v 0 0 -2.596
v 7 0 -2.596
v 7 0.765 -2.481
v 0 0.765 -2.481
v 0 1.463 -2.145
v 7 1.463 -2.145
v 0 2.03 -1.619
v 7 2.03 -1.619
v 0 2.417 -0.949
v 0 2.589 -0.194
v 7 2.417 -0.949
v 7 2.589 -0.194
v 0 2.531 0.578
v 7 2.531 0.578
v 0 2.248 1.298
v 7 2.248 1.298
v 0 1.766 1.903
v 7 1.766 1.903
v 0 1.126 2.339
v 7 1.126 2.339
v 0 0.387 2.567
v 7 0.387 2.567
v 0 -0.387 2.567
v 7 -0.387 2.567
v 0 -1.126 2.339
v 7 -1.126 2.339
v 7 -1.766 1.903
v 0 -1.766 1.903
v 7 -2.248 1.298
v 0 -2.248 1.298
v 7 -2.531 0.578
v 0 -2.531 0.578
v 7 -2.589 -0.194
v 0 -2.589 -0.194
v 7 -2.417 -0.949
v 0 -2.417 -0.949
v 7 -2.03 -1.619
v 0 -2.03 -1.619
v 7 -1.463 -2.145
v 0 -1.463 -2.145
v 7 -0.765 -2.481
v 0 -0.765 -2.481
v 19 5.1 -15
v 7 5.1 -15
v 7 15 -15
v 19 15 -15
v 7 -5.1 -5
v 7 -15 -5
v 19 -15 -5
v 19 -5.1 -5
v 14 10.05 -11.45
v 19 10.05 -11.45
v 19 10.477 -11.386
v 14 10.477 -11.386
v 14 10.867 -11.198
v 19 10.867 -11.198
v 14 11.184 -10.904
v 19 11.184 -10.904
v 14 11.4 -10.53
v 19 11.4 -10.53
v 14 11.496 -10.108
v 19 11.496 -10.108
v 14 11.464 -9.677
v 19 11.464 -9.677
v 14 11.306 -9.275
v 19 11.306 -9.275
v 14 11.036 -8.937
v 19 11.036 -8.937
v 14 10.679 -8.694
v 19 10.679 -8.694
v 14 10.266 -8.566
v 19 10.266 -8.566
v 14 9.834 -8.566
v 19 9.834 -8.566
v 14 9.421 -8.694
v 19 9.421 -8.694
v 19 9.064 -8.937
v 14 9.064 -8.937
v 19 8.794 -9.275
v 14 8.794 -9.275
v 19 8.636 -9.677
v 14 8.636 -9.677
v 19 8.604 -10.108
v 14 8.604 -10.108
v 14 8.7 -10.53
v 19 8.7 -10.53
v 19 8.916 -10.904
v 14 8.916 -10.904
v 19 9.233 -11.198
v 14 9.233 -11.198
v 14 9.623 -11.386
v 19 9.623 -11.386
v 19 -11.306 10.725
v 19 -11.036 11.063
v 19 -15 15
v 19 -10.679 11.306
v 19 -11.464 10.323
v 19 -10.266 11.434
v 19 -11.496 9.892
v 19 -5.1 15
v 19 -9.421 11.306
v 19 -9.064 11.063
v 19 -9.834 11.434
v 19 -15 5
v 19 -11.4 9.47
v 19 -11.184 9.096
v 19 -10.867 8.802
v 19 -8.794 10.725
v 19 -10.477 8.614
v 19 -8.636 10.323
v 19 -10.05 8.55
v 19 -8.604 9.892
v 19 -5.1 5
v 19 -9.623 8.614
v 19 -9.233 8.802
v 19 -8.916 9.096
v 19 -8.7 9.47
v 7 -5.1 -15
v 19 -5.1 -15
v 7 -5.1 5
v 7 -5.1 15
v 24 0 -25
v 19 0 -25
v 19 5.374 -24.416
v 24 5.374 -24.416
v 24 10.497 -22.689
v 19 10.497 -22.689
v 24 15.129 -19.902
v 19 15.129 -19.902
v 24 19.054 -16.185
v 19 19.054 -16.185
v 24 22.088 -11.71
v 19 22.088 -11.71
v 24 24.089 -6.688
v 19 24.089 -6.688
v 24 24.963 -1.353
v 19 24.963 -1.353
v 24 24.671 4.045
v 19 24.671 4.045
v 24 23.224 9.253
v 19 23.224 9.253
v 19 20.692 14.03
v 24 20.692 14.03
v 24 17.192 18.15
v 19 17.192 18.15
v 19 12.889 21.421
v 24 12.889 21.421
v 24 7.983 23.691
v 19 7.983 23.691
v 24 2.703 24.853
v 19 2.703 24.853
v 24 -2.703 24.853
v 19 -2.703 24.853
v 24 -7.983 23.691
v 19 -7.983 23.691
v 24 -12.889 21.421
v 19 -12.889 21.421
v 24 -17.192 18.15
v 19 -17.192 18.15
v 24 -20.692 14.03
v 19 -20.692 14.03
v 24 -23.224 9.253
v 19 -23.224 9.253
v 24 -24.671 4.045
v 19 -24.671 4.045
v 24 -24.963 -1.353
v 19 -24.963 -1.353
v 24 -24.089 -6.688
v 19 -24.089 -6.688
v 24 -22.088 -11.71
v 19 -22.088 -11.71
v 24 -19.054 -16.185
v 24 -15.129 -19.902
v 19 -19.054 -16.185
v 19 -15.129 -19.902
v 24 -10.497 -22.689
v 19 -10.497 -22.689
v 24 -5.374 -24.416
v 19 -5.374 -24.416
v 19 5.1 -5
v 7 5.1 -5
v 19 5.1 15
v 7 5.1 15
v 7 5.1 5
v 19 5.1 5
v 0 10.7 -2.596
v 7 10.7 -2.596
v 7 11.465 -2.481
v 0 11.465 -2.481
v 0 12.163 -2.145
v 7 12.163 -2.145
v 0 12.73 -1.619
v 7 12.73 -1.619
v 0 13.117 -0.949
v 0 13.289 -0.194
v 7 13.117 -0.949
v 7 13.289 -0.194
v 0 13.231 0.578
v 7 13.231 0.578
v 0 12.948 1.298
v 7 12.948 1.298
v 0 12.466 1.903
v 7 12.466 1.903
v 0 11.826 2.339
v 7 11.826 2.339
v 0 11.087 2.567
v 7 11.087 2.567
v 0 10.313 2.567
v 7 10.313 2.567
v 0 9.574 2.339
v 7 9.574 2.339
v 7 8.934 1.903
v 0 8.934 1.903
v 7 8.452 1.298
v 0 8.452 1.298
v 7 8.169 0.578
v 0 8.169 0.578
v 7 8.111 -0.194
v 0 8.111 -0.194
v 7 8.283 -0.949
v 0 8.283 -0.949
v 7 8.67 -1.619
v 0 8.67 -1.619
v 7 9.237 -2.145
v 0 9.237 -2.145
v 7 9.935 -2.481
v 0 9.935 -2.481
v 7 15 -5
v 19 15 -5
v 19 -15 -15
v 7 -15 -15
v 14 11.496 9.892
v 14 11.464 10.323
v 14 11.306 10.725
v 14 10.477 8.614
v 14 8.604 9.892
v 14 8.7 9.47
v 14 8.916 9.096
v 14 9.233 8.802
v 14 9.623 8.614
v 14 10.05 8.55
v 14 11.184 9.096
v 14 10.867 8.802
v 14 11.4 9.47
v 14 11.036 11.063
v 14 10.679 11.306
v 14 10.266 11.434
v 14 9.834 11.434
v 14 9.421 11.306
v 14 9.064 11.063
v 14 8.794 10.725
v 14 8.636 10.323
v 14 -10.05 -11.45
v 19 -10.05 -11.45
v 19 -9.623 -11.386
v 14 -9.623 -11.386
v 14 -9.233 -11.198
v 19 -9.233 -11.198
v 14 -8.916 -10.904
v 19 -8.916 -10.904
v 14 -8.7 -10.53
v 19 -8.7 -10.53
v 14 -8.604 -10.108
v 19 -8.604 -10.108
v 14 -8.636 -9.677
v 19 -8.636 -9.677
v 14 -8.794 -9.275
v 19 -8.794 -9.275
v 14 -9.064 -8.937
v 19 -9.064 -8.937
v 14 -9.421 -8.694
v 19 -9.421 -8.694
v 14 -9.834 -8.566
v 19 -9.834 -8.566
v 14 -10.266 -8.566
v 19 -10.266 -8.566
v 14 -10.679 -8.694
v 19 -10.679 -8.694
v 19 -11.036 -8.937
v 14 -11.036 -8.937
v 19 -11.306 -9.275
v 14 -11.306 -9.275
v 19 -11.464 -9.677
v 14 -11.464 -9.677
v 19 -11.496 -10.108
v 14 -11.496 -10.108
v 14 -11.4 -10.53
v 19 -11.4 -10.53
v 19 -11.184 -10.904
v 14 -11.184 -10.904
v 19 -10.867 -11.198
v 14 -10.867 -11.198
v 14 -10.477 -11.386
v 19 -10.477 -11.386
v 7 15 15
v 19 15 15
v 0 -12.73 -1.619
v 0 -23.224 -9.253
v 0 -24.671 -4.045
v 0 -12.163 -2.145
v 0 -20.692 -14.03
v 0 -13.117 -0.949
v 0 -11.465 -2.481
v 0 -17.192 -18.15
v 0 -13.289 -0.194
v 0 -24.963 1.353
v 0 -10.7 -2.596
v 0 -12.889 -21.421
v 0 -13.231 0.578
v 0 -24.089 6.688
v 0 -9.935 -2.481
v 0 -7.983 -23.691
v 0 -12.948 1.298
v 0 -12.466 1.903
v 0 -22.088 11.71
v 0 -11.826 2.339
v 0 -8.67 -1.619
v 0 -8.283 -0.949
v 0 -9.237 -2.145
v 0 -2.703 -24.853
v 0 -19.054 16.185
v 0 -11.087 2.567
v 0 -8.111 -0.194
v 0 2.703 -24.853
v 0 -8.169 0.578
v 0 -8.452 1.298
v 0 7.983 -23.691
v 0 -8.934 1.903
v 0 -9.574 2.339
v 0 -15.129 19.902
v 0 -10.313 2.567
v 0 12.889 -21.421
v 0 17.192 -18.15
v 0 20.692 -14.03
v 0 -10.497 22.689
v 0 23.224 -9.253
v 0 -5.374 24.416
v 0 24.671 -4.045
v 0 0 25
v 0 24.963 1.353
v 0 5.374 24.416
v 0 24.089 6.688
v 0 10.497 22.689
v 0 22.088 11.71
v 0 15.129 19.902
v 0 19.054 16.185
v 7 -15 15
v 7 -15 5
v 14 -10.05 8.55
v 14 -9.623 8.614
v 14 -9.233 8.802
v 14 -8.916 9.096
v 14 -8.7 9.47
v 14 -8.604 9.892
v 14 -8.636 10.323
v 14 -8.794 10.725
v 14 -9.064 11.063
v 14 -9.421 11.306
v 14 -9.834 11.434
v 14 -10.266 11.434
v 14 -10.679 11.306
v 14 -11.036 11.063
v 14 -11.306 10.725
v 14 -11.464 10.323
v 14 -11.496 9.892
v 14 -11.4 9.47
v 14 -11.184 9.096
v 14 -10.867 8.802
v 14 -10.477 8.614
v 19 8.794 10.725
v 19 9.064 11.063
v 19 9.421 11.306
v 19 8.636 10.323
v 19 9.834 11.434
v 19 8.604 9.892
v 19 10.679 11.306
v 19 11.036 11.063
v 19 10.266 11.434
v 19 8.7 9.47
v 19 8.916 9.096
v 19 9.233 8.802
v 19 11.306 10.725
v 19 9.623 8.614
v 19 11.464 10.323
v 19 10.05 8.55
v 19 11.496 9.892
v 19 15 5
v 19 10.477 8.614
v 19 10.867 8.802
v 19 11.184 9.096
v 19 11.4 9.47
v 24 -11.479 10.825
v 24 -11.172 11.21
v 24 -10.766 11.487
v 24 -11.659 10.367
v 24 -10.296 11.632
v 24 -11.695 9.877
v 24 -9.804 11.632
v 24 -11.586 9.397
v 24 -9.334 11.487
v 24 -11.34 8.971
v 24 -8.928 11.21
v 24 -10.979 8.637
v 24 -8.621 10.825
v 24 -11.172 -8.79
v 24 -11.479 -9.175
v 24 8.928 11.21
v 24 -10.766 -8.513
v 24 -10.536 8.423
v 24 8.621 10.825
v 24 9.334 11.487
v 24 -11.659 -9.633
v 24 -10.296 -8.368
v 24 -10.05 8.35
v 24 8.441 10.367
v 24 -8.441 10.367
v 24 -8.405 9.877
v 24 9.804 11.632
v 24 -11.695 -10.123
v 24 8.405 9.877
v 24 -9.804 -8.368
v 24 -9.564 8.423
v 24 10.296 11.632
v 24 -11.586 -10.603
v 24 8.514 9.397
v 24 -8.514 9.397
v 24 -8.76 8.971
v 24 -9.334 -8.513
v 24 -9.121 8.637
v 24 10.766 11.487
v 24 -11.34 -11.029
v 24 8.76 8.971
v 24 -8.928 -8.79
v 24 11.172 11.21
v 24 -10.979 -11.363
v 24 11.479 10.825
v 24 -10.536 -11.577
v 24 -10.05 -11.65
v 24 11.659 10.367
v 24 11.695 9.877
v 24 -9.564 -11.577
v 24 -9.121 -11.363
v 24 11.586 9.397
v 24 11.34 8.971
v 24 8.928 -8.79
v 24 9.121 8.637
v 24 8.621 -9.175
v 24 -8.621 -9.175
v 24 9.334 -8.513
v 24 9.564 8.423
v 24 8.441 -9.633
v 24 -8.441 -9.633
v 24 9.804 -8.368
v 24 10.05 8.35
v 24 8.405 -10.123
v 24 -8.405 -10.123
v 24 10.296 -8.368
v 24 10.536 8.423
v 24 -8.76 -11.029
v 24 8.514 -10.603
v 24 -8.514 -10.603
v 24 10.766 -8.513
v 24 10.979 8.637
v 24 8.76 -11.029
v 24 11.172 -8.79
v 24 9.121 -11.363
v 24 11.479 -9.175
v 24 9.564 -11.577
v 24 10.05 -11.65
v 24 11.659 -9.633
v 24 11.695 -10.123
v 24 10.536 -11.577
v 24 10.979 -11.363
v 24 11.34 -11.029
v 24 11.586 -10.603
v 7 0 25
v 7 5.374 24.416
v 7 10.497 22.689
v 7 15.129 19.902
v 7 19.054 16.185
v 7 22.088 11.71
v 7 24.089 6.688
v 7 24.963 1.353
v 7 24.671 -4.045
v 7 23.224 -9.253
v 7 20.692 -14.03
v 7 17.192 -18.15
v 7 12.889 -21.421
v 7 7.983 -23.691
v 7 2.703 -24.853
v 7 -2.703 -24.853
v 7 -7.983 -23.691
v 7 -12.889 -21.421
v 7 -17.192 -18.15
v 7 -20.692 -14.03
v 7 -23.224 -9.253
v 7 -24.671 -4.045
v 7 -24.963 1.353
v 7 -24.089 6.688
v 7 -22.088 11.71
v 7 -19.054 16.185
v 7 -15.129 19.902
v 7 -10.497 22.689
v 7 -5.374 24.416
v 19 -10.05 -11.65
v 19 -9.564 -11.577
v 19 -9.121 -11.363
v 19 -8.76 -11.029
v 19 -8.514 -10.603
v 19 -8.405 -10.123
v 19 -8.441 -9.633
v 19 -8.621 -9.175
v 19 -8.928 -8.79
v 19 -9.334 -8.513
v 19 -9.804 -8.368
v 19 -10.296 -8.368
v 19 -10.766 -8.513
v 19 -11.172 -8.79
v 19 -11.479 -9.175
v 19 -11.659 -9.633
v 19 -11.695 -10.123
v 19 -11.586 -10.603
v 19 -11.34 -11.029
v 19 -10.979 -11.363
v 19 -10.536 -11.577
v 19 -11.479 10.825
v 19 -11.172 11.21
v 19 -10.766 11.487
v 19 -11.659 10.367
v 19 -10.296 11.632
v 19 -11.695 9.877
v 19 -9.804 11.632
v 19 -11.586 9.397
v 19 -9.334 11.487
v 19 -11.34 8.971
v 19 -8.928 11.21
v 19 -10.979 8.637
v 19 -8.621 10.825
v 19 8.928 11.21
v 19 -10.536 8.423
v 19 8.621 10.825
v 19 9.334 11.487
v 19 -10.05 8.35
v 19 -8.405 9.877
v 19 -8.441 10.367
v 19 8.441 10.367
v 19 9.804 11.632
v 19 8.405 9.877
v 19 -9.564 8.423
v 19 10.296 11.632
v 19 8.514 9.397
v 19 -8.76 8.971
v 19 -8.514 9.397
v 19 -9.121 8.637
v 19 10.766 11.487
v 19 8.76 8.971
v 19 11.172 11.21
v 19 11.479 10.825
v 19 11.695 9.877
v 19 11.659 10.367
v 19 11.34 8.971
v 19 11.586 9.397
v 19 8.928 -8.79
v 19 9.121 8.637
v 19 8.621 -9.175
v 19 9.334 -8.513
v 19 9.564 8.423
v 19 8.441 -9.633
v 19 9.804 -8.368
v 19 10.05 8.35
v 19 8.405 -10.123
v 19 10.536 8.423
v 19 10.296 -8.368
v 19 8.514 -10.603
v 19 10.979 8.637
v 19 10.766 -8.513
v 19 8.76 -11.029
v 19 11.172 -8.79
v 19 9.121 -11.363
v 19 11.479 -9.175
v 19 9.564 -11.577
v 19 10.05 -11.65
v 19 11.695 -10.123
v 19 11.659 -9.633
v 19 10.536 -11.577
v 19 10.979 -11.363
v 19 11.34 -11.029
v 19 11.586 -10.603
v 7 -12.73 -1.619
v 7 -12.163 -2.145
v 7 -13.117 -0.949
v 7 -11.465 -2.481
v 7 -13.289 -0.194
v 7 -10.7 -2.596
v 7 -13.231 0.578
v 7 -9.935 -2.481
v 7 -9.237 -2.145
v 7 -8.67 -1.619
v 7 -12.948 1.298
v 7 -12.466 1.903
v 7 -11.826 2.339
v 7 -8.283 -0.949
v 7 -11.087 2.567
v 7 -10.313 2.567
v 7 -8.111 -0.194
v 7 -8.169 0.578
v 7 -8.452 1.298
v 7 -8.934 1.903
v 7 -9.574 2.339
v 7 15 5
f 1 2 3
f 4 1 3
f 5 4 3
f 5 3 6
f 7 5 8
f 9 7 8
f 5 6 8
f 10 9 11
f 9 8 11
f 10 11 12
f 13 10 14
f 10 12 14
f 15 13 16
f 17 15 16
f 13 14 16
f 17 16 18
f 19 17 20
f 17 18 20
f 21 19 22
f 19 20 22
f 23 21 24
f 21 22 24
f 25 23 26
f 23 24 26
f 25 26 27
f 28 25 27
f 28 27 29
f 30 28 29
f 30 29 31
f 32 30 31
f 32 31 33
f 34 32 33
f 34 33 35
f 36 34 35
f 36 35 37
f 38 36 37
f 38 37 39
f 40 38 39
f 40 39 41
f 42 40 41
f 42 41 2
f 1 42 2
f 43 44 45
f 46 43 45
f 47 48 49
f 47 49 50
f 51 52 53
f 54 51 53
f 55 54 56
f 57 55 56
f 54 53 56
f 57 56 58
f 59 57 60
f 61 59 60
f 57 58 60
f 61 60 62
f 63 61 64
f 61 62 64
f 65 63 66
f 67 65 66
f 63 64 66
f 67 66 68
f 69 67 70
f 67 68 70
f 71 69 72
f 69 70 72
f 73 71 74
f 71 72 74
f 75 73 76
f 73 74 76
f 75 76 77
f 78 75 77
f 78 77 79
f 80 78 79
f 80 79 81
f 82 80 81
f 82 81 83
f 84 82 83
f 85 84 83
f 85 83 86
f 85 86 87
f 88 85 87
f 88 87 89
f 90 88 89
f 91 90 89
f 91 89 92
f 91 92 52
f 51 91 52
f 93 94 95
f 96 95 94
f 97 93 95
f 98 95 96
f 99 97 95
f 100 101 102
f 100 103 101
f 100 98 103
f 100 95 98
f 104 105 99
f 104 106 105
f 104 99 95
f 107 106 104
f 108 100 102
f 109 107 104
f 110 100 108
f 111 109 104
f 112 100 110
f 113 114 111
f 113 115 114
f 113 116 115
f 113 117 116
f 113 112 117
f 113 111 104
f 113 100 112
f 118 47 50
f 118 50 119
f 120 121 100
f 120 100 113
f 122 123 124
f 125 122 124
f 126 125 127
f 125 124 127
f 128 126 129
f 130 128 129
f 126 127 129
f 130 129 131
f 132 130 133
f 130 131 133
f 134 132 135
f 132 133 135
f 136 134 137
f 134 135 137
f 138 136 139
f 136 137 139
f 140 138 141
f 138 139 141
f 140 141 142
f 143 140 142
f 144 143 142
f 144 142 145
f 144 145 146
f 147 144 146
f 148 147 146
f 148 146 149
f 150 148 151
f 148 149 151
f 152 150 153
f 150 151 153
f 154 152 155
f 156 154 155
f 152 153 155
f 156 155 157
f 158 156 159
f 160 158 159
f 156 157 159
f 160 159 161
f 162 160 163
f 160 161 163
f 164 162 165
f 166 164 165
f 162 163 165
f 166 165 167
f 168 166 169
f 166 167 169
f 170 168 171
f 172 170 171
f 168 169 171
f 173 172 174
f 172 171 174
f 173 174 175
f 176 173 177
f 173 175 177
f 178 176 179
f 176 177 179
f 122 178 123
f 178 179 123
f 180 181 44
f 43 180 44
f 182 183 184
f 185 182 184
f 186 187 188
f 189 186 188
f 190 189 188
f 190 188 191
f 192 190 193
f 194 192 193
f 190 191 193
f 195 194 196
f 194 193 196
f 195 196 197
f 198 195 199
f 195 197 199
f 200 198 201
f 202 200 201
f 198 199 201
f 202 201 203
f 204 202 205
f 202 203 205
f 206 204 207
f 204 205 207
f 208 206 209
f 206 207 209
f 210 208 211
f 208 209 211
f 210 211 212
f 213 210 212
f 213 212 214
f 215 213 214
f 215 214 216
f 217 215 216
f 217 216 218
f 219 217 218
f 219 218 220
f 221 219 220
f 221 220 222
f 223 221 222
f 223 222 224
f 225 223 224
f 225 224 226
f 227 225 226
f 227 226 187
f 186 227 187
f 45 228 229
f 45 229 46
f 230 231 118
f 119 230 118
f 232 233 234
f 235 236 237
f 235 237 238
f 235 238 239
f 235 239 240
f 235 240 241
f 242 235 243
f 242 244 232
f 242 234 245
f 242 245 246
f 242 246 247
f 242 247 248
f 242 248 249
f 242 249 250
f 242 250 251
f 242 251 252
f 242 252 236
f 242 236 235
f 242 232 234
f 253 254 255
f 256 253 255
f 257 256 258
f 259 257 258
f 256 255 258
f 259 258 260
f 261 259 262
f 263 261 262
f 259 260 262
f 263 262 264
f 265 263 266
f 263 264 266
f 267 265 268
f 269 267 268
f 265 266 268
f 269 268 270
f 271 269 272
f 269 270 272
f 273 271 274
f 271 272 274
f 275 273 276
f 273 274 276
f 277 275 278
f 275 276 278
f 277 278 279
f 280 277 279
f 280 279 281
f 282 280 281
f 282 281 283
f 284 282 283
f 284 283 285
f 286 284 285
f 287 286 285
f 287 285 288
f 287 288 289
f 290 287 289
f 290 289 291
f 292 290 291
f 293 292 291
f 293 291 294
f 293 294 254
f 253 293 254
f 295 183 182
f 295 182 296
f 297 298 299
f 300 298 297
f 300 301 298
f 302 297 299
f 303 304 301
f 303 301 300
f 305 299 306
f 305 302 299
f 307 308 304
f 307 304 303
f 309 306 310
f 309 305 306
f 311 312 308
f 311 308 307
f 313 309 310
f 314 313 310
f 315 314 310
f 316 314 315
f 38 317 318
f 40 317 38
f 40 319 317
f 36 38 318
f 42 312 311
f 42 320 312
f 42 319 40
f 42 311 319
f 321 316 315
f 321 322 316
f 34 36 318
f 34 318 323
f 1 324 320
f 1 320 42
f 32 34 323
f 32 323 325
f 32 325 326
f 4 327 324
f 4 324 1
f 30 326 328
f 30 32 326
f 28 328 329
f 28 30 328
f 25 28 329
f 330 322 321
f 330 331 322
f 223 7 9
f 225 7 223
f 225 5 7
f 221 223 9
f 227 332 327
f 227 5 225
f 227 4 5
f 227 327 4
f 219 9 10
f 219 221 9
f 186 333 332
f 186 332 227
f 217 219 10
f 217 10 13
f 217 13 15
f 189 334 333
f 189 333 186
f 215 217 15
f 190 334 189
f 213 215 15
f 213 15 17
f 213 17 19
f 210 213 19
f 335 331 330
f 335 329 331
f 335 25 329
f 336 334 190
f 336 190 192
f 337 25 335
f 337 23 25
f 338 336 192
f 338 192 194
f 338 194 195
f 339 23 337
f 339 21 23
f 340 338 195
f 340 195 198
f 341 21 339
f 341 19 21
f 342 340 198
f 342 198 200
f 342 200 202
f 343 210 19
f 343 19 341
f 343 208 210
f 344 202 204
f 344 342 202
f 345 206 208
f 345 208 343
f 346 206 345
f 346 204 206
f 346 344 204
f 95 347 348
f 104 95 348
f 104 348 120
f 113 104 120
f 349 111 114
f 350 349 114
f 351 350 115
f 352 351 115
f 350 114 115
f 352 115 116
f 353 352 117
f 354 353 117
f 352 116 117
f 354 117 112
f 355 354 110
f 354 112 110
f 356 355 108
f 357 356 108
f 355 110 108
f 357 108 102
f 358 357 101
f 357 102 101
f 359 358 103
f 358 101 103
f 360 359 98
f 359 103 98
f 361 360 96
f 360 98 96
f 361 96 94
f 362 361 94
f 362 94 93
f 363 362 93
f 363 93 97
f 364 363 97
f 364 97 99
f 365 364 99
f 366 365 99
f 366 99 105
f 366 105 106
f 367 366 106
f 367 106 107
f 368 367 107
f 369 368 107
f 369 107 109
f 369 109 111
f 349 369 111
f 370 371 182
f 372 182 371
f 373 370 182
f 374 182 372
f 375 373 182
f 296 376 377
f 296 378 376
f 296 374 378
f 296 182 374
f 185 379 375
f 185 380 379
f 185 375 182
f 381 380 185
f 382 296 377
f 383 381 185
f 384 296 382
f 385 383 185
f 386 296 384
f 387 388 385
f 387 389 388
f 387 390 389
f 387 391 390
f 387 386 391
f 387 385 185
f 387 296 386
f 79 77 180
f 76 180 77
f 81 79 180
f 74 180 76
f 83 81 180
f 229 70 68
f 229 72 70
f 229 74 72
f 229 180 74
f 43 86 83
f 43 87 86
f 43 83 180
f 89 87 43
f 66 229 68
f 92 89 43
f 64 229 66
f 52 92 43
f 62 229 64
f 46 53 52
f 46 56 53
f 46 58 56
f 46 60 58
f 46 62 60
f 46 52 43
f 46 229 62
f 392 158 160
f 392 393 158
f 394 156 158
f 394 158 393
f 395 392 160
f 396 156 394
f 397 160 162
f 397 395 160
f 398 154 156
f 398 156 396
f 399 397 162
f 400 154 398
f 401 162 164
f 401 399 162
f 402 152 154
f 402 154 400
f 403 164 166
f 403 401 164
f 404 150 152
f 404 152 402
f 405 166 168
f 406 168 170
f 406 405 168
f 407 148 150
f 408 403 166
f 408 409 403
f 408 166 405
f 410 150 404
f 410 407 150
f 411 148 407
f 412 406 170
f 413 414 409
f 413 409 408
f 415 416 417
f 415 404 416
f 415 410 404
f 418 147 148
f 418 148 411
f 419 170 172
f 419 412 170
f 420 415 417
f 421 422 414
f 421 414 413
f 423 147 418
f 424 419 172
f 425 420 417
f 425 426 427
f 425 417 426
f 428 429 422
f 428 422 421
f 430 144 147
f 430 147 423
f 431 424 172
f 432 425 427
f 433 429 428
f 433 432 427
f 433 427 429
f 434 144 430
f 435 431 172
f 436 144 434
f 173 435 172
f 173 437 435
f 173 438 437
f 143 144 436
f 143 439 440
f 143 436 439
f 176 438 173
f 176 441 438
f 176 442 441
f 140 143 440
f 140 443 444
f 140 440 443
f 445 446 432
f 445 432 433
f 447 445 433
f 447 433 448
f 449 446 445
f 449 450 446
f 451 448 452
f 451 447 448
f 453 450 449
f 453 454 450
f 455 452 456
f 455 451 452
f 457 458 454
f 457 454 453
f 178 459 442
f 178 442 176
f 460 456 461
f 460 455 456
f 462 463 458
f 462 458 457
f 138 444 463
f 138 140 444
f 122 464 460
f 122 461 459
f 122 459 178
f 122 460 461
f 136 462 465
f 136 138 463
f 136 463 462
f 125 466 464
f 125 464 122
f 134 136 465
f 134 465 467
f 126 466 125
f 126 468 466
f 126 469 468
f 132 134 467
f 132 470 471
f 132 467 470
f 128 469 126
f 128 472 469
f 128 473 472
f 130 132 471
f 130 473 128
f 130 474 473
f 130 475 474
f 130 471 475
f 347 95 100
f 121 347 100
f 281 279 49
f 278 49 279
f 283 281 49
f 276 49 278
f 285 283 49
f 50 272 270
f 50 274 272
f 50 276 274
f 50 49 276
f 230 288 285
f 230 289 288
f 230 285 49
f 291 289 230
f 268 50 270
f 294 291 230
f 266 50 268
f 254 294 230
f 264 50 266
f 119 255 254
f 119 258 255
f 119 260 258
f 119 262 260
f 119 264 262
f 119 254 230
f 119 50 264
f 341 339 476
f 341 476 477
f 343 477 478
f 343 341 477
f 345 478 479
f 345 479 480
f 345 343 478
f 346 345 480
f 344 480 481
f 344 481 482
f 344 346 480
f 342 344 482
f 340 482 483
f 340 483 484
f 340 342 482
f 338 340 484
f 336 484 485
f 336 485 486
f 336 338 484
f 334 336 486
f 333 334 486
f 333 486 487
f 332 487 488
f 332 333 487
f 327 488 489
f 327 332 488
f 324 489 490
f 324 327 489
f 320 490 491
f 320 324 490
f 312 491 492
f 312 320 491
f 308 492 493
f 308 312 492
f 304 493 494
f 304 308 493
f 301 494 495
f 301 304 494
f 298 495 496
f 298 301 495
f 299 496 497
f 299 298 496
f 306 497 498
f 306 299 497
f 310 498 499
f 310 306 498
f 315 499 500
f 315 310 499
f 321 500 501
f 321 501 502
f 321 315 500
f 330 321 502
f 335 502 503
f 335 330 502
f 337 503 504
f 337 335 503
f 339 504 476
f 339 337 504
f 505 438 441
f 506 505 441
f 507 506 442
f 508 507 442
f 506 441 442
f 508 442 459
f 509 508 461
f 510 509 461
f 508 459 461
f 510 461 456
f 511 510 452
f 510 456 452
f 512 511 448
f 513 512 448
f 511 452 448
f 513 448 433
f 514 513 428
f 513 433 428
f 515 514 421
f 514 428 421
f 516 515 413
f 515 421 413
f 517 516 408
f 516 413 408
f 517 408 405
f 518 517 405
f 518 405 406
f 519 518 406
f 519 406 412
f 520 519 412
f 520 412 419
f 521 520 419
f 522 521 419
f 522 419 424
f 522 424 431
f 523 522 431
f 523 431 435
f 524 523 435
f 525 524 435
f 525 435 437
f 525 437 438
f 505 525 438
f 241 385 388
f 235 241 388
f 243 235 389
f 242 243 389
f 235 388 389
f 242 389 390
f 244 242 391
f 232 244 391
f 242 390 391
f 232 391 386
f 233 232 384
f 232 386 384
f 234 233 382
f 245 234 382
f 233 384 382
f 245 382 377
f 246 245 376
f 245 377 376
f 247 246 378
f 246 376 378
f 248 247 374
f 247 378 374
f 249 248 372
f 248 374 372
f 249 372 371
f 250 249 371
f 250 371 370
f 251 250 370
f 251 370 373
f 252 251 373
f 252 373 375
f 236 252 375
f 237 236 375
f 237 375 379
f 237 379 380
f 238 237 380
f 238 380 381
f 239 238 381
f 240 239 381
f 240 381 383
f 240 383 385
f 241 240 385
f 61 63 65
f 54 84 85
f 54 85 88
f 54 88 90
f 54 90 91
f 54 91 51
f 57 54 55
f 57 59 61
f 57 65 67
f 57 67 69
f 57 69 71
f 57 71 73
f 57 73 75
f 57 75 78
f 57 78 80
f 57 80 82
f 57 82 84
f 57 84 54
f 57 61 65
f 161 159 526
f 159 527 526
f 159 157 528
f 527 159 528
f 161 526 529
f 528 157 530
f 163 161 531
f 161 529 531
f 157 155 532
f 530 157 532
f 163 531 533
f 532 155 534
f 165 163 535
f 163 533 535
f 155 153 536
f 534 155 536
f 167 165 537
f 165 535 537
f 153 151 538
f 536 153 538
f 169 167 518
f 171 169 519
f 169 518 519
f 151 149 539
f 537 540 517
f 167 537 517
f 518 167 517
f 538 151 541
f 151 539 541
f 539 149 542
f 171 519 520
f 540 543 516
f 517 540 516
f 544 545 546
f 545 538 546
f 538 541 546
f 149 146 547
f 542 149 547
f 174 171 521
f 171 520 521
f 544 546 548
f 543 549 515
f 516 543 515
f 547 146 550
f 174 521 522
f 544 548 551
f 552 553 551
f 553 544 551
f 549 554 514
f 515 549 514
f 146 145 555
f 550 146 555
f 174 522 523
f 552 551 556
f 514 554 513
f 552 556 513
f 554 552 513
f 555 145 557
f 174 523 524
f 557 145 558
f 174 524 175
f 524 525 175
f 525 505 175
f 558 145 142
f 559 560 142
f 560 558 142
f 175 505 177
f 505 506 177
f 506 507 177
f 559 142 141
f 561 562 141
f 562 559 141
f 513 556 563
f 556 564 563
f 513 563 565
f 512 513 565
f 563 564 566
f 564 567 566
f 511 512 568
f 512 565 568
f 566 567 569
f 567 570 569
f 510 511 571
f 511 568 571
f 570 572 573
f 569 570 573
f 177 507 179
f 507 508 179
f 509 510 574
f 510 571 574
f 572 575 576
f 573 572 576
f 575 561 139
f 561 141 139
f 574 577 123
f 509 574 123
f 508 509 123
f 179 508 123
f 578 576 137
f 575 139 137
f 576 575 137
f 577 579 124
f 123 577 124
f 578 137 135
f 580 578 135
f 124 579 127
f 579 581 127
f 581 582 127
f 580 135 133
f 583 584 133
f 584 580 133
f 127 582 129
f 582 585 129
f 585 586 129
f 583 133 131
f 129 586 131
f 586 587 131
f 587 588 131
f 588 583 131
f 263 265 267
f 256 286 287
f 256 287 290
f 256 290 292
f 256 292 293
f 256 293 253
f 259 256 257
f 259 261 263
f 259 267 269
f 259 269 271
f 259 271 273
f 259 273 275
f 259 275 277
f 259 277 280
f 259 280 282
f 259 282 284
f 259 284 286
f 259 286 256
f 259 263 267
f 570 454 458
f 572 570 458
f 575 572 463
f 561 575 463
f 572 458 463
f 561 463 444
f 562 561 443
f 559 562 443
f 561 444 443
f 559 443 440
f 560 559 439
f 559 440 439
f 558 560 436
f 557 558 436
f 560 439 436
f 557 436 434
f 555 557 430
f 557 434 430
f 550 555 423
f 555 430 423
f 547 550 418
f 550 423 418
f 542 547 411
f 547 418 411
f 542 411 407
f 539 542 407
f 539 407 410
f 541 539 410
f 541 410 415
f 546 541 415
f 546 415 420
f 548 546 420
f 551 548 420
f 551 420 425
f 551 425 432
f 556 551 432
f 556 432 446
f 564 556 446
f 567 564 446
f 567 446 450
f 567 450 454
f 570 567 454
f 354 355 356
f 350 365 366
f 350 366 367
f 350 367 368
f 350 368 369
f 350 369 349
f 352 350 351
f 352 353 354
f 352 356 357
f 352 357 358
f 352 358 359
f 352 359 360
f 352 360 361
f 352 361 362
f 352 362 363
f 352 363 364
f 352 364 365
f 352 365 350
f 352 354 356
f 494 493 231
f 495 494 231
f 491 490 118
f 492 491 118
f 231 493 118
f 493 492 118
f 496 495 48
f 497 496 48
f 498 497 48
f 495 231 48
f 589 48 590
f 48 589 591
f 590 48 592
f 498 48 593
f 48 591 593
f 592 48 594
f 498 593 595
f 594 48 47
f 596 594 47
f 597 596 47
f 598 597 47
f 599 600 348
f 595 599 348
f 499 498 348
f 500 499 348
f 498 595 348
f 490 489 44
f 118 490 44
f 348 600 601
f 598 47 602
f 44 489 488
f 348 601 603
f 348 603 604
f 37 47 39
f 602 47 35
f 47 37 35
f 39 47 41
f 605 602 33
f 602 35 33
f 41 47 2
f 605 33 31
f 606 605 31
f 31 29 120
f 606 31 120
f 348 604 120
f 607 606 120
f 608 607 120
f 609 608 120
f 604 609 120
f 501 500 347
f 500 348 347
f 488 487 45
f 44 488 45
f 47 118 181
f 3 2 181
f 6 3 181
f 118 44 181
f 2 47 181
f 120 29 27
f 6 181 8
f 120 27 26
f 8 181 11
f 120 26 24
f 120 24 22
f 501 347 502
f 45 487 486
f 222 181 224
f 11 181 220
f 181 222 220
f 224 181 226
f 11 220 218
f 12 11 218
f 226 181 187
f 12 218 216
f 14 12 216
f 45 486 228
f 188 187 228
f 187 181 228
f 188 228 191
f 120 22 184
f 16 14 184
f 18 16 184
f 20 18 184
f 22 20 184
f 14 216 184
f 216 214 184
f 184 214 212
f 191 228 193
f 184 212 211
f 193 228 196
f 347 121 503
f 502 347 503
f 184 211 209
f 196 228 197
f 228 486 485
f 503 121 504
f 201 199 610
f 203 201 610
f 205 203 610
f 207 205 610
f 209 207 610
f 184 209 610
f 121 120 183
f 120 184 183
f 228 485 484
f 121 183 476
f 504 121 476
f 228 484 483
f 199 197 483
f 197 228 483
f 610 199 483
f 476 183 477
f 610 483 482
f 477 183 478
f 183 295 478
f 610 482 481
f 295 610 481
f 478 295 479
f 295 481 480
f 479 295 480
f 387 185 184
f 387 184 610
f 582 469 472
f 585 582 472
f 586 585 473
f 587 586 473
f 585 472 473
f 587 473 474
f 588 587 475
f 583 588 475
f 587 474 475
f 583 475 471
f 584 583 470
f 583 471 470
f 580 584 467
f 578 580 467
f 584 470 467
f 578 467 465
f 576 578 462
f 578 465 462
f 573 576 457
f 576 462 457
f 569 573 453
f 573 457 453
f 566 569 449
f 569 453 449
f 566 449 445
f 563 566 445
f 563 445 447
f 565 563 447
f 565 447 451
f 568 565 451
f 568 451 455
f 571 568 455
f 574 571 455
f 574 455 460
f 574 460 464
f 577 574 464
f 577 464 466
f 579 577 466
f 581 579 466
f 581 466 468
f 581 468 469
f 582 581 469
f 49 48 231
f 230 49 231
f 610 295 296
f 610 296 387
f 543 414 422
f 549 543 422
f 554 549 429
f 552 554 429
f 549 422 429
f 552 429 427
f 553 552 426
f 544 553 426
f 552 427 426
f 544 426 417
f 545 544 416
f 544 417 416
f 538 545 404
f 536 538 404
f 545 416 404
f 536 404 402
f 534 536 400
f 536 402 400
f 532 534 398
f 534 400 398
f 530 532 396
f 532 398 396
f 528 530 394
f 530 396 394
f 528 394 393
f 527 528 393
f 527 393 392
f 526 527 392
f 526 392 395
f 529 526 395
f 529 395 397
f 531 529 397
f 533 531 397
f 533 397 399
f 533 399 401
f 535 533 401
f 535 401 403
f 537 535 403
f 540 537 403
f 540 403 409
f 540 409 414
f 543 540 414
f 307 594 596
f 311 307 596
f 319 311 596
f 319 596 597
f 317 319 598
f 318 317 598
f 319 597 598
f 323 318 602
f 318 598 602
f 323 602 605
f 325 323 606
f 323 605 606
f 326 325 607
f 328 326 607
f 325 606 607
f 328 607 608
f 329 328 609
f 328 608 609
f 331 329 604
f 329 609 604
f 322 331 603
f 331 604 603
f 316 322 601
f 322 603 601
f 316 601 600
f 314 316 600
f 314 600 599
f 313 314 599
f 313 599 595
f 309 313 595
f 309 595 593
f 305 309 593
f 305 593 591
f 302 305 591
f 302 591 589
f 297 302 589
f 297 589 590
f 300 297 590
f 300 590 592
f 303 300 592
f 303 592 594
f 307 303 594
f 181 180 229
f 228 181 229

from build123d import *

# Parameters (mm, degrees)
SKETCH1_W           = 30
SKETCH1_H           = 30
BOSS_EXTRUDE1_DEPTH = 7
SKETCH2_W           = 10
SKETCH2_H           = 9.9
BOSS_EXTRUDE2_DEPTH = 12
SKETCH3_R           = 2.596307875
CUT_EXTRUDE1_DEPTH  = 25.372115214
SKETCH4_R           = 25
SKETCH4_W           = 30
SKETCH4_H           = 30
BOSS_EXTRUDE4_DEPTH = 7
SKETCH5_R           = 25
BOSS_EXTRUDE5_DEPTH = 5
SKETCH6_R           = 1.45
CUT_EXTRUDE2_DEPTH  = 10
SKETCH7_R           = 1.65
CUT_EXTRUDE3_DEPTH  = 43.731721238


with BuildPart() as part:
    # Sketch1 → Boss-Extrude1 (new body)
    with BuildSketch(Plane(origin=(0, 0, 0), x_dir=(0, 0, -1), z_dir=(1, 0, 0))):
        Rectangle(SKETCH1_W, SKETCH1_H)
    extrude(amount=BOSS_EXTRUDE1_DEPTH)

    # Sketch2 → Boss-Extrude2 (add)
    with BuildSketch(Plane(origin=(7, 0, 0), x_dir=(0, 0, -1), z_dir=(1, 0, 0))):
        with Locations((-10, 10.05)):
            Rectangle(SKETCH2_W, SKETCH2_H)
        with Locations((10, 10.05)):
            Rectangle(SKETCH2_W, SKETCH2_H)
        with Locations((10, -10.05)):
            Rectangle(SKETCH2_W, SKETCH2_H)
        with Locations((-10, -10.05)):
            Rectangle(SKETCH2_W, SKETCH2_H)
    extrude(amount=BOSS_EXTRUDE2_DEPTH)

    # Sketch3 → Cut-Extrude1 (cut, through all)
    with BuildSketch(Plane(origin=(7, 0, 0), x_dir=(0, 0, -1), z_dir=(1, 0, 0))):
        with Locations((0, 10.7)):
            Circle(SKETCH3_R)
        with Locations((0, -10.7)):
            Circle(SKETCH3_R)
        Circle(SKETCH3_R)
    extrude(amount=-CUT_EXTRUDE1_DEPTH, mode=Mode.SUBTRACT)

    # Sketch4 → Boss-Extrude4 (add)
    with BuildSketch(Plane.ZY):
        Circle(SKETCH4_R)
        Rectangle(SKETCH4_W, SKETCH4_H, mode=Mode.SUBTRACT)
    extrude(amount=-BOSS_EXTRUDE4_DEPTH)


with BuildPart() as body_2:
    # Sketch5 → Boss-Extrude5 (new body)
    with BuildSketch(Plane(origin=(19, 0, 0), x_dir=(0, 0, -1), z_dir=(1, 0, 0))):
        Circle(SKETCH5_R)
    extrude(amount=BOSS_EXTRUDE5_DEPTH)


with BuildPart() as cut_extrude2_tool:
    # Sketch6 → Cut-Extrude2 (new body)
    with BuildSketch(Plane(origin=(24, 0, 0), x_dir=(0, 0, -1), z_dir=(1, 0, 0))):
        with Locations((-10, 10.05)):
            Circle(SKETCH6_R)
        with Locations((-10, -10.05)):
            Circle(SKETCH6_R)
        with Locations((10, -10.05)):
            Circle(SKETCH6_R)
        with Locations((10, 10.05)):
            Circle(SKETCH6_R)
    extrude(amount=-CUT_EXTRUDE2_DEPTH)


with BuildPart() as part_1:
    add(part.part)

    # Cut-Extrude2: cut by cut_extrude2_tool
    add(cut_extrude2_tool.part, mode=Mode.SUBTRACT)


with BuildPart() as body_2_1:
    add(body_2.part)

    # Cut-Extrude2: cut by cut_extrude2_tool
    add(cut_extrude2_tool.part, mode=Mode.SUBTRACT)

    # Sketch7 → Cut-Extrude3 (cut, through all)
    with BuildSketch(Plane(origin=(24, 0, 0), x_dir=(0, 0, -1), z_dir=(1, 0, 0))):
        with Locations((-10, 10.05)):
            Circle(SKETCH7_R)
        with Locations((-10, -10.05)):
            Circle(SKETCH7_R)
        with Locations((10, -10.05)):
            Circle(SKETCH7_R)
        with Locations((10, 10.05)):
            Circle(SKETCH7_R)
    extrude(amount=-CUT_EXTRUDE3_DEPTH, mode=Mode.SUBTRACT)


solid = Compound([part_1.part, body_2_1.part])
